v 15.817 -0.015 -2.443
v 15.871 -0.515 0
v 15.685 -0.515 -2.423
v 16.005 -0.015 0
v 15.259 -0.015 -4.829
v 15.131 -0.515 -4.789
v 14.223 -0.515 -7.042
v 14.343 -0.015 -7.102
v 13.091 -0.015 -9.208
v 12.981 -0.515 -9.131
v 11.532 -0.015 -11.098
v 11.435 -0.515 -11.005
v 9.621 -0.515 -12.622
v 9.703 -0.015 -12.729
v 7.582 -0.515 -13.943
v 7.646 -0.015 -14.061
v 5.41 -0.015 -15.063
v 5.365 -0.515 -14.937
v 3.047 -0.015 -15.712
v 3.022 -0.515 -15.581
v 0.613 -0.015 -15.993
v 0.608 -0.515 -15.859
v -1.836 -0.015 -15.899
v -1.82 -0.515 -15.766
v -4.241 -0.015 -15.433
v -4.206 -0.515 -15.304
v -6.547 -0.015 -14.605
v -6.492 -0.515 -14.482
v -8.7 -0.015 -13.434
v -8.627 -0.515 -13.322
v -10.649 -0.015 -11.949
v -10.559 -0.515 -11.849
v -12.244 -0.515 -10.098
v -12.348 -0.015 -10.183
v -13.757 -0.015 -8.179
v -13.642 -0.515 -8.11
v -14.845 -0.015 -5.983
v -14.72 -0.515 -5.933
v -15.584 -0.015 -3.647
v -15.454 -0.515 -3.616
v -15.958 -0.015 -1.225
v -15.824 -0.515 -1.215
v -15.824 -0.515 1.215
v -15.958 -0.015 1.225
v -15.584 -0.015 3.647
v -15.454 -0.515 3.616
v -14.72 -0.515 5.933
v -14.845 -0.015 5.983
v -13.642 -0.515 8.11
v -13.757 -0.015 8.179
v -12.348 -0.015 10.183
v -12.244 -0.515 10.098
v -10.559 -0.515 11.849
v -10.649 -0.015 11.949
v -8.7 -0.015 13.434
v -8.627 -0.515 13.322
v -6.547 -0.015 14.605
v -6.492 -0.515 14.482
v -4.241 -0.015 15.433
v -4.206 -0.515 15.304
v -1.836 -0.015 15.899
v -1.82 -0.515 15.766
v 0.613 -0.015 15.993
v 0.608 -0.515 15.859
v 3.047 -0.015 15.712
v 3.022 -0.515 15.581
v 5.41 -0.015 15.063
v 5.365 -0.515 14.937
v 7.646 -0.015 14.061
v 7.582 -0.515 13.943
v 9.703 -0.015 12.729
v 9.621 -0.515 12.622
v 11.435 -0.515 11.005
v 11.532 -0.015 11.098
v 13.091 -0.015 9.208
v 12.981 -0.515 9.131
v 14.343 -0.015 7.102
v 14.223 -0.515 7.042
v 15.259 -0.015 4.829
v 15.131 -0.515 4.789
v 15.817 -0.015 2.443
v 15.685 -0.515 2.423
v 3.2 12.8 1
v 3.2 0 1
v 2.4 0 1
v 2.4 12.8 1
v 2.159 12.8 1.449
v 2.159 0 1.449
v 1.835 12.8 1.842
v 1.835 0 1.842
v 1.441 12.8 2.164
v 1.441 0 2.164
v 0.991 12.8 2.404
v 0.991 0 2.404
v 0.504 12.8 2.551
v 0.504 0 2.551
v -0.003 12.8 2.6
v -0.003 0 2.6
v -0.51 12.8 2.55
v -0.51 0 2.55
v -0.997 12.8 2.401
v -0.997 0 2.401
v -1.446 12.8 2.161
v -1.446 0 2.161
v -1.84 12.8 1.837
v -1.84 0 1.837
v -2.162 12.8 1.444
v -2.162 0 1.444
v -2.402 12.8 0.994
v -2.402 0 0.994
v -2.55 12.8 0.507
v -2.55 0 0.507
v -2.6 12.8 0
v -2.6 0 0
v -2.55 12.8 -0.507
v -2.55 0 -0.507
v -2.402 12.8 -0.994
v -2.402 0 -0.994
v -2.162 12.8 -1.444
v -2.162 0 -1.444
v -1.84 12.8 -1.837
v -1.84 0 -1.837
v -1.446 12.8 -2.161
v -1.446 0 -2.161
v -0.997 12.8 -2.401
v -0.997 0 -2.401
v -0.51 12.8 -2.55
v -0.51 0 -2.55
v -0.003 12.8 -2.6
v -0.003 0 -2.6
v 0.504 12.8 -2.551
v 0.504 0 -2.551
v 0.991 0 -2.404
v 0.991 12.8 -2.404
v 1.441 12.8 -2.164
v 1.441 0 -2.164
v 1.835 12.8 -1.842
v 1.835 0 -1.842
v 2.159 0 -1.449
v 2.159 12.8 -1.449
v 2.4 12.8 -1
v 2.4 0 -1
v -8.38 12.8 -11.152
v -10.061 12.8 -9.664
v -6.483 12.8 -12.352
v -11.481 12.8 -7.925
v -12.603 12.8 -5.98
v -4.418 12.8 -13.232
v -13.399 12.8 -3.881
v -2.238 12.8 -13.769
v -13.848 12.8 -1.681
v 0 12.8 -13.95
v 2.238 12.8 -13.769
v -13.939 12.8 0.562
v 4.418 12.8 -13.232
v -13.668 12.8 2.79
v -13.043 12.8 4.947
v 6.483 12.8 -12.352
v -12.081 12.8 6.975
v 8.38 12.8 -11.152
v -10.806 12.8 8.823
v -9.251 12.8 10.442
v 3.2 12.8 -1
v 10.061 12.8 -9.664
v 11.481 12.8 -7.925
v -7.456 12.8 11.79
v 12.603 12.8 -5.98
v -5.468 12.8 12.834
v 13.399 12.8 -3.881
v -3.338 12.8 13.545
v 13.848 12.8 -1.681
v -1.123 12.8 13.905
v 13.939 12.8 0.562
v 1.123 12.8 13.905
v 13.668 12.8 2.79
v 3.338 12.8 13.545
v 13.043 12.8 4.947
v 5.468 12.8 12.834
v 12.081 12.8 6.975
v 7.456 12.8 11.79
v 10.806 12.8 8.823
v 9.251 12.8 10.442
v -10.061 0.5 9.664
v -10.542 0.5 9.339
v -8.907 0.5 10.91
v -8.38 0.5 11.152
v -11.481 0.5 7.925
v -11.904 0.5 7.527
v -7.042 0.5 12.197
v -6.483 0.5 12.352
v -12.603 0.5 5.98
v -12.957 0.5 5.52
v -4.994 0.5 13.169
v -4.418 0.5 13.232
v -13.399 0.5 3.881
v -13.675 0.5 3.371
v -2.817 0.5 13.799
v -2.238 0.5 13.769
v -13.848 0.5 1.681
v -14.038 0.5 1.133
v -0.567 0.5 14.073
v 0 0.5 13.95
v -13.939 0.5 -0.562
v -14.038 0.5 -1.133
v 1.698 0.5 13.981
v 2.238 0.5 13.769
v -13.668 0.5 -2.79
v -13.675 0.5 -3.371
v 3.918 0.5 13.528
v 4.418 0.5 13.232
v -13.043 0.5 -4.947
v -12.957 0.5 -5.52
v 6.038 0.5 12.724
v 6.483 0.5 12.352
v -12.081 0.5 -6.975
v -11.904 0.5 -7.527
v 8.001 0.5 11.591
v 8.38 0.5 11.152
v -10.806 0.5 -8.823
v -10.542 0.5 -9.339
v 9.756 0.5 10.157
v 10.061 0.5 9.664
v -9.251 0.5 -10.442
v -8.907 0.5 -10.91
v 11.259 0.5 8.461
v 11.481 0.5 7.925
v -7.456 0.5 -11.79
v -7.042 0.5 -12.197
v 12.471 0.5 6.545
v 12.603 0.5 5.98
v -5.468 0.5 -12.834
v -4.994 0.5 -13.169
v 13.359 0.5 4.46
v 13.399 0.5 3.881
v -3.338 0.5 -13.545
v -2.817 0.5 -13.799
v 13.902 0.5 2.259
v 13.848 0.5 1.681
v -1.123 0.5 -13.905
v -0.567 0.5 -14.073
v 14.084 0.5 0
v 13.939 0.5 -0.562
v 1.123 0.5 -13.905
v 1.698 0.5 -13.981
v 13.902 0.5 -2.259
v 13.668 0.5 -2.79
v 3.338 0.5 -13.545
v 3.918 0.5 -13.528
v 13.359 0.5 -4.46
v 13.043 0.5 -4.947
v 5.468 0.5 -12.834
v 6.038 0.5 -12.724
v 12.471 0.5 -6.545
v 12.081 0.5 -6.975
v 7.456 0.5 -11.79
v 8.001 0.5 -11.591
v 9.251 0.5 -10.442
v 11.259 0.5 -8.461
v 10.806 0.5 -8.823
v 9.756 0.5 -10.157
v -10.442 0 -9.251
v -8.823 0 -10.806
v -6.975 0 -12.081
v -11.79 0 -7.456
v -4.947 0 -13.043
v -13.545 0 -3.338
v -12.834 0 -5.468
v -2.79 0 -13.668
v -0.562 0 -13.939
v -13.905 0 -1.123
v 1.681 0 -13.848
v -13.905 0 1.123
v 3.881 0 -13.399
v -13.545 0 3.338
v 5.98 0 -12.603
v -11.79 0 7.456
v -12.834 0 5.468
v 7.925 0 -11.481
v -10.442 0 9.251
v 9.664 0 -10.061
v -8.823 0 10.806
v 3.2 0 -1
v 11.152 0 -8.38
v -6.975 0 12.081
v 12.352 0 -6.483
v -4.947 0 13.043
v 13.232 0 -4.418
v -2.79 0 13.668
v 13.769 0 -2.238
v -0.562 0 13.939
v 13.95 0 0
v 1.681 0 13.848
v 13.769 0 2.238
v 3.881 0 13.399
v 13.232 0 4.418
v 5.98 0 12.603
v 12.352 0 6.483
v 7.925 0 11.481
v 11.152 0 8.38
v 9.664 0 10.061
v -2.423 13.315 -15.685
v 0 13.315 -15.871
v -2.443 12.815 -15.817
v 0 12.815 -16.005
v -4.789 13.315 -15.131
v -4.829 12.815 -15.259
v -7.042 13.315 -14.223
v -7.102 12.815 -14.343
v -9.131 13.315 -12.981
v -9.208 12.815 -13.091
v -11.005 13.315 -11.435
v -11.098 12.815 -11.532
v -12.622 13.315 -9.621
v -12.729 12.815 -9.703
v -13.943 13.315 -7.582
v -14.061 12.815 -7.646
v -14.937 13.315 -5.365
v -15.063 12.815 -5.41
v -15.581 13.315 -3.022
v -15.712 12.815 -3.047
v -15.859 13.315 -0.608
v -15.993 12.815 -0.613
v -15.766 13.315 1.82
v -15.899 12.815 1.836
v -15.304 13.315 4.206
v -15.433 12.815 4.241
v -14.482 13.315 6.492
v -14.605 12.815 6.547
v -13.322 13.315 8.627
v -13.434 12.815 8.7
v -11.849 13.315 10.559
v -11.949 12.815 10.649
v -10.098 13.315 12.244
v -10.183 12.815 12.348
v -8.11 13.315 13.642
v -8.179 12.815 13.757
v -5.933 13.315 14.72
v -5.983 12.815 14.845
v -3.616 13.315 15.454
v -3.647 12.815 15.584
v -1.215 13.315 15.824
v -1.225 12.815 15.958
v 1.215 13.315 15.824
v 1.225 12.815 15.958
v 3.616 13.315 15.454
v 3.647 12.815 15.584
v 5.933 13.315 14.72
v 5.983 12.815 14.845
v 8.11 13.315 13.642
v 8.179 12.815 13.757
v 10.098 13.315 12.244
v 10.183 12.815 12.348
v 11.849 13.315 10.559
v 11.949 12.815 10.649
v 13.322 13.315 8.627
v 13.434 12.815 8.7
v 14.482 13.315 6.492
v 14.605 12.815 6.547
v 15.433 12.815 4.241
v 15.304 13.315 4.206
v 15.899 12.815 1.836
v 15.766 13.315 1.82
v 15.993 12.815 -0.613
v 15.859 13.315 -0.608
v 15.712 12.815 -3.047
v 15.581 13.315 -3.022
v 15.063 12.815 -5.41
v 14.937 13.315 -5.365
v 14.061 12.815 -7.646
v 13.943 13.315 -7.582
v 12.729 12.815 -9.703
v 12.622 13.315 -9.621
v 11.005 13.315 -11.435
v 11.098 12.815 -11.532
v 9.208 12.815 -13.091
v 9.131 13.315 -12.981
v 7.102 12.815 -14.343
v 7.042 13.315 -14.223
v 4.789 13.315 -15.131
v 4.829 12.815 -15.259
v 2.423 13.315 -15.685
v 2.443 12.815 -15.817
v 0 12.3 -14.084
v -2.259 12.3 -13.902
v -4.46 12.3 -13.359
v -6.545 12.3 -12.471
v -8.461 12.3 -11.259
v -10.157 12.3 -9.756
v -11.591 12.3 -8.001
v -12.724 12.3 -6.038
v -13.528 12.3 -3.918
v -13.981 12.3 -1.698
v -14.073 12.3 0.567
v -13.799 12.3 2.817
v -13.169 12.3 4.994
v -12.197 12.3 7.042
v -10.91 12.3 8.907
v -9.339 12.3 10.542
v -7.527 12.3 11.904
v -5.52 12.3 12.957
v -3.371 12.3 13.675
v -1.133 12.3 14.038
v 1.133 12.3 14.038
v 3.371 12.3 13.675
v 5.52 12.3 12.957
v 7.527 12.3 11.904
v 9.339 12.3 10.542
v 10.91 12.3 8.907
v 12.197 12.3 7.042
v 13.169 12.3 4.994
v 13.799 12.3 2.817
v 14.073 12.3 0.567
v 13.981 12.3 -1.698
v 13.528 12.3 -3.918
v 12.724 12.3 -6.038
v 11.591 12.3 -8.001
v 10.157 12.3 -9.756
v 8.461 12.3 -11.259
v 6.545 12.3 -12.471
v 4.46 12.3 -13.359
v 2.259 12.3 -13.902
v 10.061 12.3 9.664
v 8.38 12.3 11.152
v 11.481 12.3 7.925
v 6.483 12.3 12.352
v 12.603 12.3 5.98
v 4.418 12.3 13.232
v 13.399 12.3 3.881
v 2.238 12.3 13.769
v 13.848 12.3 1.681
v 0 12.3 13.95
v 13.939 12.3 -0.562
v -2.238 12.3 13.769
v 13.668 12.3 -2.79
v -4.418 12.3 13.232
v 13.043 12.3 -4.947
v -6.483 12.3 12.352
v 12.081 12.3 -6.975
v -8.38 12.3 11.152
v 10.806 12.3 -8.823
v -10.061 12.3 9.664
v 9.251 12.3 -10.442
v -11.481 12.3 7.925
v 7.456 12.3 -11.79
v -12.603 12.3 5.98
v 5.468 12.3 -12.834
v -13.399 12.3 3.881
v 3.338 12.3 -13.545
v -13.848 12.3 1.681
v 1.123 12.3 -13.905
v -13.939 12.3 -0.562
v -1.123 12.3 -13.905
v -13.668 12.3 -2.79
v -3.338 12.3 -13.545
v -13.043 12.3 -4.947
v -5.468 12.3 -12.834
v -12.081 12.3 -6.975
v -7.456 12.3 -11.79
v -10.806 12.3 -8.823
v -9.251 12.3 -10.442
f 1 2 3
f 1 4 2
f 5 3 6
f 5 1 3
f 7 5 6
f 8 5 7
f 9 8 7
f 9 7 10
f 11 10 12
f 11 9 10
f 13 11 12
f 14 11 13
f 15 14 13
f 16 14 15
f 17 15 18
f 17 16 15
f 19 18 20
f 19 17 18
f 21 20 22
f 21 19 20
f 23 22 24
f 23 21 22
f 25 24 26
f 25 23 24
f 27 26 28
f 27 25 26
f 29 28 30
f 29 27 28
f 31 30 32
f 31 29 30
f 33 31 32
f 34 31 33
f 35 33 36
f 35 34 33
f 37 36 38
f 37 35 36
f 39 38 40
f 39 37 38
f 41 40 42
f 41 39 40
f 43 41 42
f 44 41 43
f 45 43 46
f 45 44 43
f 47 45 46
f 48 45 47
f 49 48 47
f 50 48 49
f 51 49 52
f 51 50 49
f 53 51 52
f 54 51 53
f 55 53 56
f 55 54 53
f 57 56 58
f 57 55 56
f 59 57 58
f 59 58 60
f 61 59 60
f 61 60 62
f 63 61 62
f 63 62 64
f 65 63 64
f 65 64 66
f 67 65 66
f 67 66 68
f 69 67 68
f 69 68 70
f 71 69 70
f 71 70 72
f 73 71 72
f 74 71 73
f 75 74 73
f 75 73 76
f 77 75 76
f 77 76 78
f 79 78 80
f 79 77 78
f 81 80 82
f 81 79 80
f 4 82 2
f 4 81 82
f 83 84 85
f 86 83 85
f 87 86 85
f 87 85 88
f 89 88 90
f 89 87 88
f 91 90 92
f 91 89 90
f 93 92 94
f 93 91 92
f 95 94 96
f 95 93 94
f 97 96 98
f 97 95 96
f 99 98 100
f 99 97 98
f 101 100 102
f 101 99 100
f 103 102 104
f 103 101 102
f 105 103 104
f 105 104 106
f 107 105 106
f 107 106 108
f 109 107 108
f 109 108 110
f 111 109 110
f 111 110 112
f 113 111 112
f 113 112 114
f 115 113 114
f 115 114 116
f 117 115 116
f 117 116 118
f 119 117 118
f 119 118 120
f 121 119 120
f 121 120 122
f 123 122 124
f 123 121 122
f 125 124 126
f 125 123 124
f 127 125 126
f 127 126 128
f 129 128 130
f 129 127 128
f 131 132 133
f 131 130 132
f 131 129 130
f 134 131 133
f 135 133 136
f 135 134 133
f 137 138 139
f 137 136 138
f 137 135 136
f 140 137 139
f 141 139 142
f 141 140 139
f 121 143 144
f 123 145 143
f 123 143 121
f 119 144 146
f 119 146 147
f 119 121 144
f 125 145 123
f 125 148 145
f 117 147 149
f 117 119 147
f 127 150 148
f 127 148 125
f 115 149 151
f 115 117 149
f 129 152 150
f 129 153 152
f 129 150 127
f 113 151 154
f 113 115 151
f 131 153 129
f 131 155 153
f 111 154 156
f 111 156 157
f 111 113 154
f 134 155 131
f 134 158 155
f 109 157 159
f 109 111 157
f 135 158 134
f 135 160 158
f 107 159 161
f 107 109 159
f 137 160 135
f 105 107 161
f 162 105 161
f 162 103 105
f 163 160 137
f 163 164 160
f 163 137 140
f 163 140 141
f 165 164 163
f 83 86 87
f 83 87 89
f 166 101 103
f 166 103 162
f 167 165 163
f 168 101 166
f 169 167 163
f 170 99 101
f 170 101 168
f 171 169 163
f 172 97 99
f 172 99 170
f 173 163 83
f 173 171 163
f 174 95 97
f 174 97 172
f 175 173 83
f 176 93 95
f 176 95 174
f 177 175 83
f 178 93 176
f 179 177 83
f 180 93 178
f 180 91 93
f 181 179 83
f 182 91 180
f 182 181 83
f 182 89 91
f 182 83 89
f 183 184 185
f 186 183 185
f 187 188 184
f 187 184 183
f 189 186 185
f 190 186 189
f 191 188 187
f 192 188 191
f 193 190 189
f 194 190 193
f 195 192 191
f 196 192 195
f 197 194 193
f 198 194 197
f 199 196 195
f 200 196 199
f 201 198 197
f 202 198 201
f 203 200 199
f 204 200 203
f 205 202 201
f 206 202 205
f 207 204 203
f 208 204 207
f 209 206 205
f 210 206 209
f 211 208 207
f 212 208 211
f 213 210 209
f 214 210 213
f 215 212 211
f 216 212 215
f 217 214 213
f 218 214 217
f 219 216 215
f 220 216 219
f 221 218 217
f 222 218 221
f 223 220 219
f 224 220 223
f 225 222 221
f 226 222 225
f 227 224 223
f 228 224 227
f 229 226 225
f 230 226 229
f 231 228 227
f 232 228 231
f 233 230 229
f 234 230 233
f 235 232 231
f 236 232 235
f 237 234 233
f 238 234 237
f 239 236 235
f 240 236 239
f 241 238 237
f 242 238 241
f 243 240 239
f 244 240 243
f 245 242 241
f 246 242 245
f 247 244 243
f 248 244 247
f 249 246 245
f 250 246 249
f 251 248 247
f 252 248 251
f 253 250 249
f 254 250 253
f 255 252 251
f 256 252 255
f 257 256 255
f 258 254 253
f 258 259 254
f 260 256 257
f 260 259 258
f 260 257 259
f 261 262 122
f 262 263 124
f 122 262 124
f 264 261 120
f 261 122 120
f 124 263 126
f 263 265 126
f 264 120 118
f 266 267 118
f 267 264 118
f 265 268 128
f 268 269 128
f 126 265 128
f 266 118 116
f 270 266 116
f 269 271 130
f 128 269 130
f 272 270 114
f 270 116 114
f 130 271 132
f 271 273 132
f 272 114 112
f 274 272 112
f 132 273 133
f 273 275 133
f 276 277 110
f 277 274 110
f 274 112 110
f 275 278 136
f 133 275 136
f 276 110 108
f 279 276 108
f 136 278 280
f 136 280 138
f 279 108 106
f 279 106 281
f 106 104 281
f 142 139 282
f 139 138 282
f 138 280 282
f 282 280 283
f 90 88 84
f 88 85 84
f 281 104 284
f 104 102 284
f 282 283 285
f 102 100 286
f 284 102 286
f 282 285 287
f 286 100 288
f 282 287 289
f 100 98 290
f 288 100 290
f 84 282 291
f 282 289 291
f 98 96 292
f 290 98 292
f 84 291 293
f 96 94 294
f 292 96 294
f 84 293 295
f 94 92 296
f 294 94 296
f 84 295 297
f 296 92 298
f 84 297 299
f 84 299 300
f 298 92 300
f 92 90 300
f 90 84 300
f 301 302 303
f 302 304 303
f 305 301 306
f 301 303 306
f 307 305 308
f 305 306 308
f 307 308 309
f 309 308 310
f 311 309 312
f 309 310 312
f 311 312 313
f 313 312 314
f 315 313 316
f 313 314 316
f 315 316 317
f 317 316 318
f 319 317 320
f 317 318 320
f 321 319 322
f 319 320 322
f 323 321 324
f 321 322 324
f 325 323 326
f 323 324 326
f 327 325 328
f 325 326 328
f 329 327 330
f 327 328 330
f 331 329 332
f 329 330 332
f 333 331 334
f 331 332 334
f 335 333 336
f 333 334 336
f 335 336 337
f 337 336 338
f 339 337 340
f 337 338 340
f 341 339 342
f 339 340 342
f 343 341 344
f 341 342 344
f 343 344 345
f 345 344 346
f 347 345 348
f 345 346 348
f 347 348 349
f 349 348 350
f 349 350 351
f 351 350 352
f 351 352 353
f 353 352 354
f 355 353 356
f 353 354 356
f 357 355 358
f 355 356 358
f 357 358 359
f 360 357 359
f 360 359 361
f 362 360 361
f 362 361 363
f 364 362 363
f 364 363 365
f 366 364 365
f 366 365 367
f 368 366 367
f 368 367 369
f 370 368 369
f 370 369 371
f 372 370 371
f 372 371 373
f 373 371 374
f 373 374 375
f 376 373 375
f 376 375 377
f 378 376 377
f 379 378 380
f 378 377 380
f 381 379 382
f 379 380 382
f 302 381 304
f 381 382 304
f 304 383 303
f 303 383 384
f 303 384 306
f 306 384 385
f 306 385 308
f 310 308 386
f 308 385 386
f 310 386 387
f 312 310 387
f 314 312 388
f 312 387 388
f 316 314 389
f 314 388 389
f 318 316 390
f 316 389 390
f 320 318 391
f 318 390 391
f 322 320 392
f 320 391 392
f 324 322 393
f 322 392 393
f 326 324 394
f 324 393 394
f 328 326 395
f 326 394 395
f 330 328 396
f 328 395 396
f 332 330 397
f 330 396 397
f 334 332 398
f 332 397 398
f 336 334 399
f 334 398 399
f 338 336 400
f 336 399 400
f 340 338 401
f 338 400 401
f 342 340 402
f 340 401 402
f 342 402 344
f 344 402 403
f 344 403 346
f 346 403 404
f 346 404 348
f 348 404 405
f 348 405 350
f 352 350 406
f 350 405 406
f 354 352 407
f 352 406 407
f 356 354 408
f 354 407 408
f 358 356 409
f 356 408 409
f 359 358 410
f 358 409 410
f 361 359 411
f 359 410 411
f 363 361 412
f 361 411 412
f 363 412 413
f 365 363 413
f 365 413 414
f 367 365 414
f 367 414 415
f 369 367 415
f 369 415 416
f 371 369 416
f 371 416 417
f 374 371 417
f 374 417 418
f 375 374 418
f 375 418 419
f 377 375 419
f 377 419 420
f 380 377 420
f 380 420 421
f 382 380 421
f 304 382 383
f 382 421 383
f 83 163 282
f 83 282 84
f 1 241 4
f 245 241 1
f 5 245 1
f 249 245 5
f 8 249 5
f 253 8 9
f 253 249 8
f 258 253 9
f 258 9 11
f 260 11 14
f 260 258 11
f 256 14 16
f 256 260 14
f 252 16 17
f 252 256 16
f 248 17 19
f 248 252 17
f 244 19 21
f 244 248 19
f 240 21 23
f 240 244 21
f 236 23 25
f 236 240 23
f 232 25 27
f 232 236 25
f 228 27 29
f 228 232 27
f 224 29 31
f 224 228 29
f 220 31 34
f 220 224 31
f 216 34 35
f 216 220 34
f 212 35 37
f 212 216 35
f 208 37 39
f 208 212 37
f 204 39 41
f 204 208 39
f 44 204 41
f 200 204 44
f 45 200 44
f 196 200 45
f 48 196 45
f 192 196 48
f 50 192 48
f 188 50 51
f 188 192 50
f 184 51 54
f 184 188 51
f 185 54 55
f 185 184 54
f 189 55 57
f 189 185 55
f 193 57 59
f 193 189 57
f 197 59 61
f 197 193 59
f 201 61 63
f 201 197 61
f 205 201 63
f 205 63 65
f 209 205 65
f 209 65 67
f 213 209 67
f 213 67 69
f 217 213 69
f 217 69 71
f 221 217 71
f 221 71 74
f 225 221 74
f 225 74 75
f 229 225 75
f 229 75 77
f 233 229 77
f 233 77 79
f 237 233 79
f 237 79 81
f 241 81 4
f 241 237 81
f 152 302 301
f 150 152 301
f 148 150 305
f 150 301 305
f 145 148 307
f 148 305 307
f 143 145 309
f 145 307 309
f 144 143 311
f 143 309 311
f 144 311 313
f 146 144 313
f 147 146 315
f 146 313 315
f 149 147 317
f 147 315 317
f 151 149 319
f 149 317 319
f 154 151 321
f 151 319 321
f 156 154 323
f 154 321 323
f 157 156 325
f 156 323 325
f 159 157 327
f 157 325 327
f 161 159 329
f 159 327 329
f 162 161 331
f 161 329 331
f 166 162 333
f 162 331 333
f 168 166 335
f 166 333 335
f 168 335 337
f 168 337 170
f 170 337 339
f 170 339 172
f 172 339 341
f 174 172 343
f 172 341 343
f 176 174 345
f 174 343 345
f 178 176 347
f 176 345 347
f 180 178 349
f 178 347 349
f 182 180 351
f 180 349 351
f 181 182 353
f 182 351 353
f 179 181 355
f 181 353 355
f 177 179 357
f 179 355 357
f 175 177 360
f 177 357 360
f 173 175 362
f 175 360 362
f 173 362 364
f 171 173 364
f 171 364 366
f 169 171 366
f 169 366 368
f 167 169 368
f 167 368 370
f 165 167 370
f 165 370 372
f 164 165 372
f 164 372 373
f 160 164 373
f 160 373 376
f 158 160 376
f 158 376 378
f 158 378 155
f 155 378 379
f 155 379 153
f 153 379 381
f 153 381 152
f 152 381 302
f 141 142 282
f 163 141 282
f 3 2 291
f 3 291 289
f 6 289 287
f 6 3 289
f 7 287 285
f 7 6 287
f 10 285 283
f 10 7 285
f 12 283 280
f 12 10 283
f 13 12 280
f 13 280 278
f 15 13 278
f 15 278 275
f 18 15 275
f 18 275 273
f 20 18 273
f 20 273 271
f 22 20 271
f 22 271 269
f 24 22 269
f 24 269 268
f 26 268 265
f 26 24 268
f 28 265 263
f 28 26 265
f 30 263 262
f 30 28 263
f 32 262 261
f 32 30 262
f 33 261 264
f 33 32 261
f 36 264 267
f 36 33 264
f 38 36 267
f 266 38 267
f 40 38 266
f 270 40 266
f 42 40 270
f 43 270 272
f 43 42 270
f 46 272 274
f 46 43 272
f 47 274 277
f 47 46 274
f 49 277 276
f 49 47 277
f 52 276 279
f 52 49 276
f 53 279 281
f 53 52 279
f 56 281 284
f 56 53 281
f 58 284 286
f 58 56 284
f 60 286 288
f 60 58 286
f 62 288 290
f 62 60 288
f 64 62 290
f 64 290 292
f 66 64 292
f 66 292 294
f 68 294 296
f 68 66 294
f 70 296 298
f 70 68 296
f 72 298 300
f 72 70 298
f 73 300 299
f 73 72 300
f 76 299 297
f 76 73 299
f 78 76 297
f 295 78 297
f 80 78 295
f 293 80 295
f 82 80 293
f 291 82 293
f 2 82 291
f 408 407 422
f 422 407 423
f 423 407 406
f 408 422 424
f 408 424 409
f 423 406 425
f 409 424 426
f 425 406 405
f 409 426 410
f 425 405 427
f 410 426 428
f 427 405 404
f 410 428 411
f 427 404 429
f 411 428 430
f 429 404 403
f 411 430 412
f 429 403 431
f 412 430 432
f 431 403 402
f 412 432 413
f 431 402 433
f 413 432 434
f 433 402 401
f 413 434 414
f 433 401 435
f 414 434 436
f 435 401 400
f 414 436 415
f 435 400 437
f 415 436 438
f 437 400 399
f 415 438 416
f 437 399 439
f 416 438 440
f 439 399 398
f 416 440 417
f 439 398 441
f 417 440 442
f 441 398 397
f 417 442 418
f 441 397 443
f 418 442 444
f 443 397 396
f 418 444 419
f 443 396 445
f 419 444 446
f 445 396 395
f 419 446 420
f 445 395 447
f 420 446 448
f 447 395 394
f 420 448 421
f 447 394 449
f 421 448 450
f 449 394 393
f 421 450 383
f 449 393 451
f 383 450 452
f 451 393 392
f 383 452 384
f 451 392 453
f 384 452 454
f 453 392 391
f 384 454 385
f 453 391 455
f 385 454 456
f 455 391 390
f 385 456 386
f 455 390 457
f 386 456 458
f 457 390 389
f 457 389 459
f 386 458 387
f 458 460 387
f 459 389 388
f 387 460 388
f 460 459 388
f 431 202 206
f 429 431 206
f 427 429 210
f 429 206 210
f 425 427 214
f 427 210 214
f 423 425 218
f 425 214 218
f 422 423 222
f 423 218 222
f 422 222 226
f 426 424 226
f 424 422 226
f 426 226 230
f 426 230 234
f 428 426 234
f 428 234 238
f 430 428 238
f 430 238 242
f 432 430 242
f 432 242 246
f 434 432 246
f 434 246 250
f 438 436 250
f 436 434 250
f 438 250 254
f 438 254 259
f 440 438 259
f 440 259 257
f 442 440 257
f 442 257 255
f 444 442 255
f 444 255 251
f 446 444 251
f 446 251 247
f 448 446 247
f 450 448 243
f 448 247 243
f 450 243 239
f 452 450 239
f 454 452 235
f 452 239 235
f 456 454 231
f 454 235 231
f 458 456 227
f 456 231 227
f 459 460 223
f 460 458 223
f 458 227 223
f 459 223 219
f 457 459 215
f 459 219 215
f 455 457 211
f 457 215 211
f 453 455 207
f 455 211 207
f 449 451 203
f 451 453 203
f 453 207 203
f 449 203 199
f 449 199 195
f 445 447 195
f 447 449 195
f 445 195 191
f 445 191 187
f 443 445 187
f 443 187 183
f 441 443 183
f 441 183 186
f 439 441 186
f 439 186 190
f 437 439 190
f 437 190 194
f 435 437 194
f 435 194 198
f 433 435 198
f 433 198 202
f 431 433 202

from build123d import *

# Parameters (mm, degrees)
SKETCH_1_R          = 13.95
EXTRUDE_1_DEPTH     = 12.8
CUT_EXTRUDE_1_DEPTH = 20


with BuildPart() as part:
    # 草图1 → 凸台-拉伸1 (new body)
    with BuildSketch(Plane(origin=(0, 0, 0), x_dir=(1, 0, 0), z_dir=(0, 1, 0))):
        with Locations(Location((0, 0, 0), (0, 0, 270))):
            Circle(SKETCH_1_R)
    extrude(amount=EXTRUDE_1_DEPTH)

    # 草图2 → 切除-拉伸1 (cut)
    with BuildSketch(Plane(origin=(0, 12.8, 0), x_dir=(1, 0, 0), z_dir=(0, 1, 0))):
        with BuildLine():
            Line((2.4, 1), (3.2, 1))
            Line((3.2, 1), (3.2, -1))
            Line((3.2, -1), (2.4, -1))
            ThreePointArc((2.4, -1), (-2.6, 0), (2.4, 1))
        make_face()
    extrude(amount=-CUT_EXTRUDE_1_DEPTH, mode=Mode.SUBTRACT)

    # 草图6 → 旋转1 (revolve)
    with BuildSketch(Plane.XY, mode=Mode.PRIVATE) as revolve_1_sk:
        Polygon((12.14125, 12.3), (12.14125, 12.8), (13.95, 12.8), (15.871025404, 13.314737206), (16.005, 12.814737206), (14.083974596, 12.3), align=None)
    revolve(revolve_1_sk.sketch.rotate(Axis((0, 0, 0), (0, 1, 0)), 90), axis=Axis((0, 0, 0), (0, 1, 0)))

    # 草图8 → 旋转2 (revolve)
    with BuildSketch(Plane.XY):
        Polygon((12.14125, 0.5), (12.14125, 0), (13.95, 0), (15.871025404, -0.514737206), (16.005, -0.014737206), (14.083974596, 0.5), align=None)
    revolve(axis=Axis((0, 0, 0), (0, 1, 0)))


solid = part.part
